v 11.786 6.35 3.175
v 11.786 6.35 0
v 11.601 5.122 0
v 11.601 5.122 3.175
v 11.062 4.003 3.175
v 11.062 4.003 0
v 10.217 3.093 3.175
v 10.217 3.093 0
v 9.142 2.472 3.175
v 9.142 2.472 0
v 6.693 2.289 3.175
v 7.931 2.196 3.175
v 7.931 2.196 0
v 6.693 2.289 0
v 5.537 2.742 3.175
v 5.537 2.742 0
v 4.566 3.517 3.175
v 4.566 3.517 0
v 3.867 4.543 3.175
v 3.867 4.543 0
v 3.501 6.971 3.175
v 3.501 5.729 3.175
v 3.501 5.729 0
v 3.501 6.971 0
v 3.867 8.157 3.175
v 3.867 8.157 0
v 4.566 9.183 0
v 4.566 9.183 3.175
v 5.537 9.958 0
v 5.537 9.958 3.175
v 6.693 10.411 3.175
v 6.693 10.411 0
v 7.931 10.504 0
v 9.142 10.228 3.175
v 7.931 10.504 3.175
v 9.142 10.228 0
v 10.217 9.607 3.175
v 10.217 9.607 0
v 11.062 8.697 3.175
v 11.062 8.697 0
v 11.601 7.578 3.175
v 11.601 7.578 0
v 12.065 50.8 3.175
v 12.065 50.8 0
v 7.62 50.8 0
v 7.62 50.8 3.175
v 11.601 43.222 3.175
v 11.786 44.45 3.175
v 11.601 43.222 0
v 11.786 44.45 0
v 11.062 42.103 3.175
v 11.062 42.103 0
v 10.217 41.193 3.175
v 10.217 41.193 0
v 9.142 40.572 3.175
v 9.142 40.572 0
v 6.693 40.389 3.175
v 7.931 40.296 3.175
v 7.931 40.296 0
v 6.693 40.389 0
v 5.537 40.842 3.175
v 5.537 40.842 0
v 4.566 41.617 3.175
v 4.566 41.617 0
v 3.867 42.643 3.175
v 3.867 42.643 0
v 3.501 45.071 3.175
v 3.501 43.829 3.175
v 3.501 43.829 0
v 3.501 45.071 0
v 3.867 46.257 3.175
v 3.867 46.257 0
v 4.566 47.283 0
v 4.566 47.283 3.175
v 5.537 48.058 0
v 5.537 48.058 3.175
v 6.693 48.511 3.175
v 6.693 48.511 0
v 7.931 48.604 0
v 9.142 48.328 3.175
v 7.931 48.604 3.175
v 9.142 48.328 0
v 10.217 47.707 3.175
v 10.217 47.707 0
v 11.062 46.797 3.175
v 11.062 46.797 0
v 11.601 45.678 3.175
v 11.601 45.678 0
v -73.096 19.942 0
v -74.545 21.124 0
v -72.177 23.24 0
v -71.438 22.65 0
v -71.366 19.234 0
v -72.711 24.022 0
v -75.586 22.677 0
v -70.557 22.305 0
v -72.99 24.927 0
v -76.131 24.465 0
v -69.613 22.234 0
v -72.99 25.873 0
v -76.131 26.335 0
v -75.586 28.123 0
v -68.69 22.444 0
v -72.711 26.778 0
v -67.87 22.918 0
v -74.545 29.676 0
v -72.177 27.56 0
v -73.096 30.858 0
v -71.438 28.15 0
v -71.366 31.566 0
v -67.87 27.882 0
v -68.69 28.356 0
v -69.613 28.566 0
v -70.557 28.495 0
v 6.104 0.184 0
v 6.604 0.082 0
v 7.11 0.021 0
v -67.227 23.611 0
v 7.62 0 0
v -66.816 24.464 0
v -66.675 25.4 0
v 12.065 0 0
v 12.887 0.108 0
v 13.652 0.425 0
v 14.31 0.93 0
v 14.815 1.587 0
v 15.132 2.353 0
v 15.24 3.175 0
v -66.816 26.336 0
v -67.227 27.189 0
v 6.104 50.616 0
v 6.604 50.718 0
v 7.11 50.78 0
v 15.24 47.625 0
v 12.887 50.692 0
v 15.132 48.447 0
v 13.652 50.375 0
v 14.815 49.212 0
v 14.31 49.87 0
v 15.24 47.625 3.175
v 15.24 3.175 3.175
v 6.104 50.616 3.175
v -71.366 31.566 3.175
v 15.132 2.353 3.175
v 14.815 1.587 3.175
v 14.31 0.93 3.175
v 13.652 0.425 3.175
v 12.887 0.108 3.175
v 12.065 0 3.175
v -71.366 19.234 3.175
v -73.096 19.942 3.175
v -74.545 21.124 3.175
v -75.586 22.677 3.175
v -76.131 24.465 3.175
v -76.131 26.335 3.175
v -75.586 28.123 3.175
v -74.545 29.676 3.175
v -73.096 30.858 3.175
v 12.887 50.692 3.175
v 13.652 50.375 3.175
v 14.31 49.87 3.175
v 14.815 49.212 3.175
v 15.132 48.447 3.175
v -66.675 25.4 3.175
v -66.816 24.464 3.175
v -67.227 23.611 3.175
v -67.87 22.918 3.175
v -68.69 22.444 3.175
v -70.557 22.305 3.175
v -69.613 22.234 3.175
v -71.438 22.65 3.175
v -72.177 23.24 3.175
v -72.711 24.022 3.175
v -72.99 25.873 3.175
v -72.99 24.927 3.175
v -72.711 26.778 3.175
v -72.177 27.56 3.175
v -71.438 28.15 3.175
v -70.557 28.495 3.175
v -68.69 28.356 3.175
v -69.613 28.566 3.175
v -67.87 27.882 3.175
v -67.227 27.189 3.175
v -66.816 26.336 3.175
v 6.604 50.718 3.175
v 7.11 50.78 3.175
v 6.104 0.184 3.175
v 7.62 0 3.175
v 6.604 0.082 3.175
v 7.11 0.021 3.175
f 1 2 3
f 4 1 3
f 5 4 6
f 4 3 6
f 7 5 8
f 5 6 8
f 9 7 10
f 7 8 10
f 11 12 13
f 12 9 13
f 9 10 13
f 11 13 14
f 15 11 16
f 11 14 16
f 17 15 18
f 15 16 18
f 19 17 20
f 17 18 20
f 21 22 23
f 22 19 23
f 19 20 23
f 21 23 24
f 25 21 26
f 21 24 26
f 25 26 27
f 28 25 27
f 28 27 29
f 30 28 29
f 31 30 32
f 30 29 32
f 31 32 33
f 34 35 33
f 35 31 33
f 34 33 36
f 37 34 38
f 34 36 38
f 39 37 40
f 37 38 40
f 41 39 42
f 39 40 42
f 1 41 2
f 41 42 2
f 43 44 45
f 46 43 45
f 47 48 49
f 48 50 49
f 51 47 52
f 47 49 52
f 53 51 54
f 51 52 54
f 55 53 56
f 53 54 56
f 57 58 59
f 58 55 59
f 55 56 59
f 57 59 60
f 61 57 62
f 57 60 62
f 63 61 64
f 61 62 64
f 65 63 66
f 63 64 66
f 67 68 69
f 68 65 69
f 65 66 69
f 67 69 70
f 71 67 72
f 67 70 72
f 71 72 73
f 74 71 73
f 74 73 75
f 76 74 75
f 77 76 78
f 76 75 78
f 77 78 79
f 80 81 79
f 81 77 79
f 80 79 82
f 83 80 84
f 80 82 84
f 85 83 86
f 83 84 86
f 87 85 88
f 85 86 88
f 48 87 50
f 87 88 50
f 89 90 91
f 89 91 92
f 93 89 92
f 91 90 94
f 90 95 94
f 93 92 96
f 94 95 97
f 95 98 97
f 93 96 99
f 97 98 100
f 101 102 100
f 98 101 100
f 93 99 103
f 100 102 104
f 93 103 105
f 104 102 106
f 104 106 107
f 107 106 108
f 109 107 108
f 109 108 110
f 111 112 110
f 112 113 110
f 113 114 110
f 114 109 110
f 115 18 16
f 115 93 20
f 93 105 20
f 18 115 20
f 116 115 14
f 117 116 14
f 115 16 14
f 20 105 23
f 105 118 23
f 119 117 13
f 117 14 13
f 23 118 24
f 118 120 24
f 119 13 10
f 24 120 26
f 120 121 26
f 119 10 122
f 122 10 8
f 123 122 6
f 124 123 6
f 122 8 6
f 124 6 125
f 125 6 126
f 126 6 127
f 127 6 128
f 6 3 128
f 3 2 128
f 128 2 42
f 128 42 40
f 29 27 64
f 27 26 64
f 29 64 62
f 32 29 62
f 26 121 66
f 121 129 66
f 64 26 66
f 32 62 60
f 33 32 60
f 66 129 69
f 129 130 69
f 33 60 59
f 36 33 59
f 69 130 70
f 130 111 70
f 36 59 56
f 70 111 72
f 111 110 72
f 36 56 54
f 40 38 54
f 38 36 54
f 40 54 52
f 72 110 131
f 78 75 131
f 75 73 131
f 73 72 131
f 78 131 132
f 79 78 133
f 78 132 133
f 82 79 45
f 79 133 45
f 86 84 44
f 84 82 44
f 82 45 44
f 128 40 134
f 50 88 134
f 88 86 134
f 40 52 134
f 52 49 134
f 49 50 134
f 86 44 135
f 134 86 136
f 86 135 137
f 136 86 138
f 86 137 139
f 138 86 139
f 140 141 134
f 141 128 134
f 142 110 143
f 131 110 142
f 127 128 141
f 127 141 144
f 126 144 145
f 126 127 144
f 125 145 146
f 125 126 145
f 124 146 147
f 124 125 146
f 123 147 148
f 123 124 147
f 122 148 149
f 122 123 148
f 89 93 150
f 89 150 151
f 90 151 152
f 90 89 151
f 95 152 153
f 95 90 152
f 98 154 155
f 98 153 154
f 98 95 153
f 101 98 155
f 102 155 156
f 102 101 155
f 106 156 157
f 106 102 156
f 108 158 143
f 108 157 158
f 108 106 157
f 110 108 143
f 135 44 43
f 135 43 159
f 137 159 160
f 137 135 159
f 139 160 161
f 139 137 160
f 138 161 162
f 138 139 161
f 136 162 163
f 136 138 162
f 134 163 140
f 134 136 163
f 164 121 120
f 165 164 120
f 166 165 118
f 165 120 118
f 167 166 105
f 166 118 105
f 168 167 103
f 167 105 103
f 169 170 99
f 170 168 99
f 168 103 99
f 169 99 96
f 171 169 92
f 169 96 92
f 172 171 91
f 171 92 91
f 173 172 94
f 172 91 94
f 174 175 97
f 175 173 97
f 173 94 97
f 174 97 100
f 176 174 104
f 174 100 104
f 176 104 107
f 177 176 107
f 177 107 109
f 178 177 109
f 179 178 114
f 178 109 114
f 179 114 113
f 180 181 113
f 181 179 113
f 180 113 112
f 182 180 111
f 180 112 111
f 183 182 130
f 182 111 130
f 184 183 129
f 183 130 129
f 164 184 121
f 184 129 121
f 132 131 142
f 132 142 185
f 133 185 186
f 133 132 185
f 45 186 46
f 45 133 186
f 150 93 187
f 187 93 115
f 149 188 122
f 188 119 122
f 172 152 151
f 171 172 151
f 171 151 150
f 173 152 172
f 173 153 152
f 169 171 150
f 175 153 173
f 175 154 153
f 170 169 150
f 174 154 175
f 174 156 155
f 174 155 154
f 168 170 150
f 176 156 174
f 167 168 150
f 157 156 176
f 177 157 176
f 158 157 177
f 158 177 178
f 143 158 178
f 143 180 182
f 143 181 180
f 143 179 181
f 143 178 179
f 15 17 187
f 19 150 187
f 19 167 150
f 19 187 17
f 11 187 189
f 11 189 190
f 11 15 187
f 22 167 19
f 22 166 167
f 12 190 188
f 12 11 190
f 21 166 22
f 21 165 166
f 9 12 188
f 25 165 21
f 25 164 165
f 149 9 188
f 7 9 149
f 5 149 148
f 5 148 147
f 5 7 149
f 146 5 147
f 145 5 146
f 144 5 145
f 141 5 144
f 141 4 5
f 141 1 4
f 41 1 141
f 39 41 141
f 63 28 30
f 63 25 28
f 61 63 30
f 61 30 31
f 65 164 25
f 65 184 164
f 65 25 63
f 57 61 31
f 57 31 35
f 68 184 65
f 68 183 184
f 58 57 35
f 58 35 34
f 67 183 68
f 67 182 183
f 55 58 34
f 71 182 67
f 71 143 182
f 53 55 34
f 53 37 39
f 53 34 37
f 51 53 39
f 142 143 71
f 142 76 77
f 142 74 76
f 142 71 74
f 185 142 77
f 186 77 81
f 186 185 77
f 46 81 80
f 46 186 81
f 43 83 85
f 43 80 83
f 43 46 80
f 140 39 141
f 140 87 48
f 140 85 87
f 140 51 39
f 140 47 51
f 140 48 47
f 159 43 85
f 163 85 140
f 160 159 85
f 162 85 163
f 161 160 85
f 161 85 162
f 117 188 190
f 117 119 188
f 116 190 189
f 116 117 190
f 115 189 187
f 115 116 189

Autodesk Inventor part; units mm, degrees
ref_plane "YZ Plane" through (0, 0, 0) normal (1, 0, 0) x (0, 1, 0)
ref_plane "XZ Plane" through (0, 0, 0) normal (0, 1, 0) x (-1, 0, 0)
ref_plane "XY Plane" through (0, 0, 0) normal (0, 0, 1) x (1, 0, 0)
sketch "Sketch1" plane through (0, 0, 0) normal (0, 0, 1) x (1, 0, 0)
  line L0 (7.62, 0) -> (12.065, 0)
  line L1 (15.24, 3.175) -> (15.24, 47.625)
  line L2 (12.065, 50.8) -> (7.62, 50.8)
  circle A0 centre (7.62, 44.45) radius 4.1656
  circle A1 centre (7.62, 6.35) radius 4.1656
  arc A2 (15.24, 47.625) -> (12.065, 50.8) centre (12.065, 47.625) ccw
  arc A3 (12.065, 0) -> (15.24, 3.175) centre (12.065, 3.175) ccw
  circle A4 centre (-69.85, 25.4) radius 3.175
  arc A5 (-71.3663, 31.5663) -> (-71.3663, 19.2337) centre (-69.85, 25.4) ccw
  arc A6 (7.62, 50.8) -> (6.1037, 50.6163) centre (7.62, 44.45) ccw
  arc A7 (6.1037, 0.1837) -> (7.62, 0) centre (7.62, 6.35) ccw
  line L3 (-69.85, 25.4) -> (7.62, 44.45) construction
  line L4 (-69.85, 25.4) -> (7.62, 6.35) construction
  line L5 (15.24, 25.4) -> (-69.85, 25.4) construction
  line L6 (-71.3663, 31.5663) -> (6.1037, 50.6163)
  line L7 (-71.3663, 19.2337) -> (6.1037, 0.1837)
  line L8 (0, 42.5762) -> (0, 0) construction
  point P0 (15.24, 50.8)
  point P1 (15.24, 0)
  dimension "d1" = 50.8
  dimension "d2" = 38.1
  dimension "d3" = 6.35
  dimension "d4" = 8.3312
  dimension "d5" = 8.3312
  dimension "d9" = 3.175
  dimension "d12" = 6.35
  dimension "d14" = 12.7
  dimension "d16" = 15.24
  dimension "d18" = 76.185
  dimension "d19" = 50.8
  dimension "d20" = 25.4
  dimension "d21" = 85.09
  dimension "d22" = 69.85
  dimension "d23" = 76.185
  dimension "d24" = 27.63
  dimension "d25" = 27.63
  dimension "d26" = 152.37
  dimension "d27" = 13.815
  dimension "d28" = 4.445
  dimension "d29" = 77.47
  dimension "d30" = 19.05
  dimension "d31" = 13.815
  dimension "d32" = 13.815
  dimension "d33" = 7.62
  dimension "d34" = 6.35
  dimension "d35" = 90
  dimension "d36" = 7.62
  dimension "d37" = 6.35
  dimension "d38" = 4.445
  dimension "d39" = 3.175
extrude "Extrusion1" add sketch "Sketch1" along normal blind 3.175
equation "\"d5\" = d4"
properties part number "pully mount"
